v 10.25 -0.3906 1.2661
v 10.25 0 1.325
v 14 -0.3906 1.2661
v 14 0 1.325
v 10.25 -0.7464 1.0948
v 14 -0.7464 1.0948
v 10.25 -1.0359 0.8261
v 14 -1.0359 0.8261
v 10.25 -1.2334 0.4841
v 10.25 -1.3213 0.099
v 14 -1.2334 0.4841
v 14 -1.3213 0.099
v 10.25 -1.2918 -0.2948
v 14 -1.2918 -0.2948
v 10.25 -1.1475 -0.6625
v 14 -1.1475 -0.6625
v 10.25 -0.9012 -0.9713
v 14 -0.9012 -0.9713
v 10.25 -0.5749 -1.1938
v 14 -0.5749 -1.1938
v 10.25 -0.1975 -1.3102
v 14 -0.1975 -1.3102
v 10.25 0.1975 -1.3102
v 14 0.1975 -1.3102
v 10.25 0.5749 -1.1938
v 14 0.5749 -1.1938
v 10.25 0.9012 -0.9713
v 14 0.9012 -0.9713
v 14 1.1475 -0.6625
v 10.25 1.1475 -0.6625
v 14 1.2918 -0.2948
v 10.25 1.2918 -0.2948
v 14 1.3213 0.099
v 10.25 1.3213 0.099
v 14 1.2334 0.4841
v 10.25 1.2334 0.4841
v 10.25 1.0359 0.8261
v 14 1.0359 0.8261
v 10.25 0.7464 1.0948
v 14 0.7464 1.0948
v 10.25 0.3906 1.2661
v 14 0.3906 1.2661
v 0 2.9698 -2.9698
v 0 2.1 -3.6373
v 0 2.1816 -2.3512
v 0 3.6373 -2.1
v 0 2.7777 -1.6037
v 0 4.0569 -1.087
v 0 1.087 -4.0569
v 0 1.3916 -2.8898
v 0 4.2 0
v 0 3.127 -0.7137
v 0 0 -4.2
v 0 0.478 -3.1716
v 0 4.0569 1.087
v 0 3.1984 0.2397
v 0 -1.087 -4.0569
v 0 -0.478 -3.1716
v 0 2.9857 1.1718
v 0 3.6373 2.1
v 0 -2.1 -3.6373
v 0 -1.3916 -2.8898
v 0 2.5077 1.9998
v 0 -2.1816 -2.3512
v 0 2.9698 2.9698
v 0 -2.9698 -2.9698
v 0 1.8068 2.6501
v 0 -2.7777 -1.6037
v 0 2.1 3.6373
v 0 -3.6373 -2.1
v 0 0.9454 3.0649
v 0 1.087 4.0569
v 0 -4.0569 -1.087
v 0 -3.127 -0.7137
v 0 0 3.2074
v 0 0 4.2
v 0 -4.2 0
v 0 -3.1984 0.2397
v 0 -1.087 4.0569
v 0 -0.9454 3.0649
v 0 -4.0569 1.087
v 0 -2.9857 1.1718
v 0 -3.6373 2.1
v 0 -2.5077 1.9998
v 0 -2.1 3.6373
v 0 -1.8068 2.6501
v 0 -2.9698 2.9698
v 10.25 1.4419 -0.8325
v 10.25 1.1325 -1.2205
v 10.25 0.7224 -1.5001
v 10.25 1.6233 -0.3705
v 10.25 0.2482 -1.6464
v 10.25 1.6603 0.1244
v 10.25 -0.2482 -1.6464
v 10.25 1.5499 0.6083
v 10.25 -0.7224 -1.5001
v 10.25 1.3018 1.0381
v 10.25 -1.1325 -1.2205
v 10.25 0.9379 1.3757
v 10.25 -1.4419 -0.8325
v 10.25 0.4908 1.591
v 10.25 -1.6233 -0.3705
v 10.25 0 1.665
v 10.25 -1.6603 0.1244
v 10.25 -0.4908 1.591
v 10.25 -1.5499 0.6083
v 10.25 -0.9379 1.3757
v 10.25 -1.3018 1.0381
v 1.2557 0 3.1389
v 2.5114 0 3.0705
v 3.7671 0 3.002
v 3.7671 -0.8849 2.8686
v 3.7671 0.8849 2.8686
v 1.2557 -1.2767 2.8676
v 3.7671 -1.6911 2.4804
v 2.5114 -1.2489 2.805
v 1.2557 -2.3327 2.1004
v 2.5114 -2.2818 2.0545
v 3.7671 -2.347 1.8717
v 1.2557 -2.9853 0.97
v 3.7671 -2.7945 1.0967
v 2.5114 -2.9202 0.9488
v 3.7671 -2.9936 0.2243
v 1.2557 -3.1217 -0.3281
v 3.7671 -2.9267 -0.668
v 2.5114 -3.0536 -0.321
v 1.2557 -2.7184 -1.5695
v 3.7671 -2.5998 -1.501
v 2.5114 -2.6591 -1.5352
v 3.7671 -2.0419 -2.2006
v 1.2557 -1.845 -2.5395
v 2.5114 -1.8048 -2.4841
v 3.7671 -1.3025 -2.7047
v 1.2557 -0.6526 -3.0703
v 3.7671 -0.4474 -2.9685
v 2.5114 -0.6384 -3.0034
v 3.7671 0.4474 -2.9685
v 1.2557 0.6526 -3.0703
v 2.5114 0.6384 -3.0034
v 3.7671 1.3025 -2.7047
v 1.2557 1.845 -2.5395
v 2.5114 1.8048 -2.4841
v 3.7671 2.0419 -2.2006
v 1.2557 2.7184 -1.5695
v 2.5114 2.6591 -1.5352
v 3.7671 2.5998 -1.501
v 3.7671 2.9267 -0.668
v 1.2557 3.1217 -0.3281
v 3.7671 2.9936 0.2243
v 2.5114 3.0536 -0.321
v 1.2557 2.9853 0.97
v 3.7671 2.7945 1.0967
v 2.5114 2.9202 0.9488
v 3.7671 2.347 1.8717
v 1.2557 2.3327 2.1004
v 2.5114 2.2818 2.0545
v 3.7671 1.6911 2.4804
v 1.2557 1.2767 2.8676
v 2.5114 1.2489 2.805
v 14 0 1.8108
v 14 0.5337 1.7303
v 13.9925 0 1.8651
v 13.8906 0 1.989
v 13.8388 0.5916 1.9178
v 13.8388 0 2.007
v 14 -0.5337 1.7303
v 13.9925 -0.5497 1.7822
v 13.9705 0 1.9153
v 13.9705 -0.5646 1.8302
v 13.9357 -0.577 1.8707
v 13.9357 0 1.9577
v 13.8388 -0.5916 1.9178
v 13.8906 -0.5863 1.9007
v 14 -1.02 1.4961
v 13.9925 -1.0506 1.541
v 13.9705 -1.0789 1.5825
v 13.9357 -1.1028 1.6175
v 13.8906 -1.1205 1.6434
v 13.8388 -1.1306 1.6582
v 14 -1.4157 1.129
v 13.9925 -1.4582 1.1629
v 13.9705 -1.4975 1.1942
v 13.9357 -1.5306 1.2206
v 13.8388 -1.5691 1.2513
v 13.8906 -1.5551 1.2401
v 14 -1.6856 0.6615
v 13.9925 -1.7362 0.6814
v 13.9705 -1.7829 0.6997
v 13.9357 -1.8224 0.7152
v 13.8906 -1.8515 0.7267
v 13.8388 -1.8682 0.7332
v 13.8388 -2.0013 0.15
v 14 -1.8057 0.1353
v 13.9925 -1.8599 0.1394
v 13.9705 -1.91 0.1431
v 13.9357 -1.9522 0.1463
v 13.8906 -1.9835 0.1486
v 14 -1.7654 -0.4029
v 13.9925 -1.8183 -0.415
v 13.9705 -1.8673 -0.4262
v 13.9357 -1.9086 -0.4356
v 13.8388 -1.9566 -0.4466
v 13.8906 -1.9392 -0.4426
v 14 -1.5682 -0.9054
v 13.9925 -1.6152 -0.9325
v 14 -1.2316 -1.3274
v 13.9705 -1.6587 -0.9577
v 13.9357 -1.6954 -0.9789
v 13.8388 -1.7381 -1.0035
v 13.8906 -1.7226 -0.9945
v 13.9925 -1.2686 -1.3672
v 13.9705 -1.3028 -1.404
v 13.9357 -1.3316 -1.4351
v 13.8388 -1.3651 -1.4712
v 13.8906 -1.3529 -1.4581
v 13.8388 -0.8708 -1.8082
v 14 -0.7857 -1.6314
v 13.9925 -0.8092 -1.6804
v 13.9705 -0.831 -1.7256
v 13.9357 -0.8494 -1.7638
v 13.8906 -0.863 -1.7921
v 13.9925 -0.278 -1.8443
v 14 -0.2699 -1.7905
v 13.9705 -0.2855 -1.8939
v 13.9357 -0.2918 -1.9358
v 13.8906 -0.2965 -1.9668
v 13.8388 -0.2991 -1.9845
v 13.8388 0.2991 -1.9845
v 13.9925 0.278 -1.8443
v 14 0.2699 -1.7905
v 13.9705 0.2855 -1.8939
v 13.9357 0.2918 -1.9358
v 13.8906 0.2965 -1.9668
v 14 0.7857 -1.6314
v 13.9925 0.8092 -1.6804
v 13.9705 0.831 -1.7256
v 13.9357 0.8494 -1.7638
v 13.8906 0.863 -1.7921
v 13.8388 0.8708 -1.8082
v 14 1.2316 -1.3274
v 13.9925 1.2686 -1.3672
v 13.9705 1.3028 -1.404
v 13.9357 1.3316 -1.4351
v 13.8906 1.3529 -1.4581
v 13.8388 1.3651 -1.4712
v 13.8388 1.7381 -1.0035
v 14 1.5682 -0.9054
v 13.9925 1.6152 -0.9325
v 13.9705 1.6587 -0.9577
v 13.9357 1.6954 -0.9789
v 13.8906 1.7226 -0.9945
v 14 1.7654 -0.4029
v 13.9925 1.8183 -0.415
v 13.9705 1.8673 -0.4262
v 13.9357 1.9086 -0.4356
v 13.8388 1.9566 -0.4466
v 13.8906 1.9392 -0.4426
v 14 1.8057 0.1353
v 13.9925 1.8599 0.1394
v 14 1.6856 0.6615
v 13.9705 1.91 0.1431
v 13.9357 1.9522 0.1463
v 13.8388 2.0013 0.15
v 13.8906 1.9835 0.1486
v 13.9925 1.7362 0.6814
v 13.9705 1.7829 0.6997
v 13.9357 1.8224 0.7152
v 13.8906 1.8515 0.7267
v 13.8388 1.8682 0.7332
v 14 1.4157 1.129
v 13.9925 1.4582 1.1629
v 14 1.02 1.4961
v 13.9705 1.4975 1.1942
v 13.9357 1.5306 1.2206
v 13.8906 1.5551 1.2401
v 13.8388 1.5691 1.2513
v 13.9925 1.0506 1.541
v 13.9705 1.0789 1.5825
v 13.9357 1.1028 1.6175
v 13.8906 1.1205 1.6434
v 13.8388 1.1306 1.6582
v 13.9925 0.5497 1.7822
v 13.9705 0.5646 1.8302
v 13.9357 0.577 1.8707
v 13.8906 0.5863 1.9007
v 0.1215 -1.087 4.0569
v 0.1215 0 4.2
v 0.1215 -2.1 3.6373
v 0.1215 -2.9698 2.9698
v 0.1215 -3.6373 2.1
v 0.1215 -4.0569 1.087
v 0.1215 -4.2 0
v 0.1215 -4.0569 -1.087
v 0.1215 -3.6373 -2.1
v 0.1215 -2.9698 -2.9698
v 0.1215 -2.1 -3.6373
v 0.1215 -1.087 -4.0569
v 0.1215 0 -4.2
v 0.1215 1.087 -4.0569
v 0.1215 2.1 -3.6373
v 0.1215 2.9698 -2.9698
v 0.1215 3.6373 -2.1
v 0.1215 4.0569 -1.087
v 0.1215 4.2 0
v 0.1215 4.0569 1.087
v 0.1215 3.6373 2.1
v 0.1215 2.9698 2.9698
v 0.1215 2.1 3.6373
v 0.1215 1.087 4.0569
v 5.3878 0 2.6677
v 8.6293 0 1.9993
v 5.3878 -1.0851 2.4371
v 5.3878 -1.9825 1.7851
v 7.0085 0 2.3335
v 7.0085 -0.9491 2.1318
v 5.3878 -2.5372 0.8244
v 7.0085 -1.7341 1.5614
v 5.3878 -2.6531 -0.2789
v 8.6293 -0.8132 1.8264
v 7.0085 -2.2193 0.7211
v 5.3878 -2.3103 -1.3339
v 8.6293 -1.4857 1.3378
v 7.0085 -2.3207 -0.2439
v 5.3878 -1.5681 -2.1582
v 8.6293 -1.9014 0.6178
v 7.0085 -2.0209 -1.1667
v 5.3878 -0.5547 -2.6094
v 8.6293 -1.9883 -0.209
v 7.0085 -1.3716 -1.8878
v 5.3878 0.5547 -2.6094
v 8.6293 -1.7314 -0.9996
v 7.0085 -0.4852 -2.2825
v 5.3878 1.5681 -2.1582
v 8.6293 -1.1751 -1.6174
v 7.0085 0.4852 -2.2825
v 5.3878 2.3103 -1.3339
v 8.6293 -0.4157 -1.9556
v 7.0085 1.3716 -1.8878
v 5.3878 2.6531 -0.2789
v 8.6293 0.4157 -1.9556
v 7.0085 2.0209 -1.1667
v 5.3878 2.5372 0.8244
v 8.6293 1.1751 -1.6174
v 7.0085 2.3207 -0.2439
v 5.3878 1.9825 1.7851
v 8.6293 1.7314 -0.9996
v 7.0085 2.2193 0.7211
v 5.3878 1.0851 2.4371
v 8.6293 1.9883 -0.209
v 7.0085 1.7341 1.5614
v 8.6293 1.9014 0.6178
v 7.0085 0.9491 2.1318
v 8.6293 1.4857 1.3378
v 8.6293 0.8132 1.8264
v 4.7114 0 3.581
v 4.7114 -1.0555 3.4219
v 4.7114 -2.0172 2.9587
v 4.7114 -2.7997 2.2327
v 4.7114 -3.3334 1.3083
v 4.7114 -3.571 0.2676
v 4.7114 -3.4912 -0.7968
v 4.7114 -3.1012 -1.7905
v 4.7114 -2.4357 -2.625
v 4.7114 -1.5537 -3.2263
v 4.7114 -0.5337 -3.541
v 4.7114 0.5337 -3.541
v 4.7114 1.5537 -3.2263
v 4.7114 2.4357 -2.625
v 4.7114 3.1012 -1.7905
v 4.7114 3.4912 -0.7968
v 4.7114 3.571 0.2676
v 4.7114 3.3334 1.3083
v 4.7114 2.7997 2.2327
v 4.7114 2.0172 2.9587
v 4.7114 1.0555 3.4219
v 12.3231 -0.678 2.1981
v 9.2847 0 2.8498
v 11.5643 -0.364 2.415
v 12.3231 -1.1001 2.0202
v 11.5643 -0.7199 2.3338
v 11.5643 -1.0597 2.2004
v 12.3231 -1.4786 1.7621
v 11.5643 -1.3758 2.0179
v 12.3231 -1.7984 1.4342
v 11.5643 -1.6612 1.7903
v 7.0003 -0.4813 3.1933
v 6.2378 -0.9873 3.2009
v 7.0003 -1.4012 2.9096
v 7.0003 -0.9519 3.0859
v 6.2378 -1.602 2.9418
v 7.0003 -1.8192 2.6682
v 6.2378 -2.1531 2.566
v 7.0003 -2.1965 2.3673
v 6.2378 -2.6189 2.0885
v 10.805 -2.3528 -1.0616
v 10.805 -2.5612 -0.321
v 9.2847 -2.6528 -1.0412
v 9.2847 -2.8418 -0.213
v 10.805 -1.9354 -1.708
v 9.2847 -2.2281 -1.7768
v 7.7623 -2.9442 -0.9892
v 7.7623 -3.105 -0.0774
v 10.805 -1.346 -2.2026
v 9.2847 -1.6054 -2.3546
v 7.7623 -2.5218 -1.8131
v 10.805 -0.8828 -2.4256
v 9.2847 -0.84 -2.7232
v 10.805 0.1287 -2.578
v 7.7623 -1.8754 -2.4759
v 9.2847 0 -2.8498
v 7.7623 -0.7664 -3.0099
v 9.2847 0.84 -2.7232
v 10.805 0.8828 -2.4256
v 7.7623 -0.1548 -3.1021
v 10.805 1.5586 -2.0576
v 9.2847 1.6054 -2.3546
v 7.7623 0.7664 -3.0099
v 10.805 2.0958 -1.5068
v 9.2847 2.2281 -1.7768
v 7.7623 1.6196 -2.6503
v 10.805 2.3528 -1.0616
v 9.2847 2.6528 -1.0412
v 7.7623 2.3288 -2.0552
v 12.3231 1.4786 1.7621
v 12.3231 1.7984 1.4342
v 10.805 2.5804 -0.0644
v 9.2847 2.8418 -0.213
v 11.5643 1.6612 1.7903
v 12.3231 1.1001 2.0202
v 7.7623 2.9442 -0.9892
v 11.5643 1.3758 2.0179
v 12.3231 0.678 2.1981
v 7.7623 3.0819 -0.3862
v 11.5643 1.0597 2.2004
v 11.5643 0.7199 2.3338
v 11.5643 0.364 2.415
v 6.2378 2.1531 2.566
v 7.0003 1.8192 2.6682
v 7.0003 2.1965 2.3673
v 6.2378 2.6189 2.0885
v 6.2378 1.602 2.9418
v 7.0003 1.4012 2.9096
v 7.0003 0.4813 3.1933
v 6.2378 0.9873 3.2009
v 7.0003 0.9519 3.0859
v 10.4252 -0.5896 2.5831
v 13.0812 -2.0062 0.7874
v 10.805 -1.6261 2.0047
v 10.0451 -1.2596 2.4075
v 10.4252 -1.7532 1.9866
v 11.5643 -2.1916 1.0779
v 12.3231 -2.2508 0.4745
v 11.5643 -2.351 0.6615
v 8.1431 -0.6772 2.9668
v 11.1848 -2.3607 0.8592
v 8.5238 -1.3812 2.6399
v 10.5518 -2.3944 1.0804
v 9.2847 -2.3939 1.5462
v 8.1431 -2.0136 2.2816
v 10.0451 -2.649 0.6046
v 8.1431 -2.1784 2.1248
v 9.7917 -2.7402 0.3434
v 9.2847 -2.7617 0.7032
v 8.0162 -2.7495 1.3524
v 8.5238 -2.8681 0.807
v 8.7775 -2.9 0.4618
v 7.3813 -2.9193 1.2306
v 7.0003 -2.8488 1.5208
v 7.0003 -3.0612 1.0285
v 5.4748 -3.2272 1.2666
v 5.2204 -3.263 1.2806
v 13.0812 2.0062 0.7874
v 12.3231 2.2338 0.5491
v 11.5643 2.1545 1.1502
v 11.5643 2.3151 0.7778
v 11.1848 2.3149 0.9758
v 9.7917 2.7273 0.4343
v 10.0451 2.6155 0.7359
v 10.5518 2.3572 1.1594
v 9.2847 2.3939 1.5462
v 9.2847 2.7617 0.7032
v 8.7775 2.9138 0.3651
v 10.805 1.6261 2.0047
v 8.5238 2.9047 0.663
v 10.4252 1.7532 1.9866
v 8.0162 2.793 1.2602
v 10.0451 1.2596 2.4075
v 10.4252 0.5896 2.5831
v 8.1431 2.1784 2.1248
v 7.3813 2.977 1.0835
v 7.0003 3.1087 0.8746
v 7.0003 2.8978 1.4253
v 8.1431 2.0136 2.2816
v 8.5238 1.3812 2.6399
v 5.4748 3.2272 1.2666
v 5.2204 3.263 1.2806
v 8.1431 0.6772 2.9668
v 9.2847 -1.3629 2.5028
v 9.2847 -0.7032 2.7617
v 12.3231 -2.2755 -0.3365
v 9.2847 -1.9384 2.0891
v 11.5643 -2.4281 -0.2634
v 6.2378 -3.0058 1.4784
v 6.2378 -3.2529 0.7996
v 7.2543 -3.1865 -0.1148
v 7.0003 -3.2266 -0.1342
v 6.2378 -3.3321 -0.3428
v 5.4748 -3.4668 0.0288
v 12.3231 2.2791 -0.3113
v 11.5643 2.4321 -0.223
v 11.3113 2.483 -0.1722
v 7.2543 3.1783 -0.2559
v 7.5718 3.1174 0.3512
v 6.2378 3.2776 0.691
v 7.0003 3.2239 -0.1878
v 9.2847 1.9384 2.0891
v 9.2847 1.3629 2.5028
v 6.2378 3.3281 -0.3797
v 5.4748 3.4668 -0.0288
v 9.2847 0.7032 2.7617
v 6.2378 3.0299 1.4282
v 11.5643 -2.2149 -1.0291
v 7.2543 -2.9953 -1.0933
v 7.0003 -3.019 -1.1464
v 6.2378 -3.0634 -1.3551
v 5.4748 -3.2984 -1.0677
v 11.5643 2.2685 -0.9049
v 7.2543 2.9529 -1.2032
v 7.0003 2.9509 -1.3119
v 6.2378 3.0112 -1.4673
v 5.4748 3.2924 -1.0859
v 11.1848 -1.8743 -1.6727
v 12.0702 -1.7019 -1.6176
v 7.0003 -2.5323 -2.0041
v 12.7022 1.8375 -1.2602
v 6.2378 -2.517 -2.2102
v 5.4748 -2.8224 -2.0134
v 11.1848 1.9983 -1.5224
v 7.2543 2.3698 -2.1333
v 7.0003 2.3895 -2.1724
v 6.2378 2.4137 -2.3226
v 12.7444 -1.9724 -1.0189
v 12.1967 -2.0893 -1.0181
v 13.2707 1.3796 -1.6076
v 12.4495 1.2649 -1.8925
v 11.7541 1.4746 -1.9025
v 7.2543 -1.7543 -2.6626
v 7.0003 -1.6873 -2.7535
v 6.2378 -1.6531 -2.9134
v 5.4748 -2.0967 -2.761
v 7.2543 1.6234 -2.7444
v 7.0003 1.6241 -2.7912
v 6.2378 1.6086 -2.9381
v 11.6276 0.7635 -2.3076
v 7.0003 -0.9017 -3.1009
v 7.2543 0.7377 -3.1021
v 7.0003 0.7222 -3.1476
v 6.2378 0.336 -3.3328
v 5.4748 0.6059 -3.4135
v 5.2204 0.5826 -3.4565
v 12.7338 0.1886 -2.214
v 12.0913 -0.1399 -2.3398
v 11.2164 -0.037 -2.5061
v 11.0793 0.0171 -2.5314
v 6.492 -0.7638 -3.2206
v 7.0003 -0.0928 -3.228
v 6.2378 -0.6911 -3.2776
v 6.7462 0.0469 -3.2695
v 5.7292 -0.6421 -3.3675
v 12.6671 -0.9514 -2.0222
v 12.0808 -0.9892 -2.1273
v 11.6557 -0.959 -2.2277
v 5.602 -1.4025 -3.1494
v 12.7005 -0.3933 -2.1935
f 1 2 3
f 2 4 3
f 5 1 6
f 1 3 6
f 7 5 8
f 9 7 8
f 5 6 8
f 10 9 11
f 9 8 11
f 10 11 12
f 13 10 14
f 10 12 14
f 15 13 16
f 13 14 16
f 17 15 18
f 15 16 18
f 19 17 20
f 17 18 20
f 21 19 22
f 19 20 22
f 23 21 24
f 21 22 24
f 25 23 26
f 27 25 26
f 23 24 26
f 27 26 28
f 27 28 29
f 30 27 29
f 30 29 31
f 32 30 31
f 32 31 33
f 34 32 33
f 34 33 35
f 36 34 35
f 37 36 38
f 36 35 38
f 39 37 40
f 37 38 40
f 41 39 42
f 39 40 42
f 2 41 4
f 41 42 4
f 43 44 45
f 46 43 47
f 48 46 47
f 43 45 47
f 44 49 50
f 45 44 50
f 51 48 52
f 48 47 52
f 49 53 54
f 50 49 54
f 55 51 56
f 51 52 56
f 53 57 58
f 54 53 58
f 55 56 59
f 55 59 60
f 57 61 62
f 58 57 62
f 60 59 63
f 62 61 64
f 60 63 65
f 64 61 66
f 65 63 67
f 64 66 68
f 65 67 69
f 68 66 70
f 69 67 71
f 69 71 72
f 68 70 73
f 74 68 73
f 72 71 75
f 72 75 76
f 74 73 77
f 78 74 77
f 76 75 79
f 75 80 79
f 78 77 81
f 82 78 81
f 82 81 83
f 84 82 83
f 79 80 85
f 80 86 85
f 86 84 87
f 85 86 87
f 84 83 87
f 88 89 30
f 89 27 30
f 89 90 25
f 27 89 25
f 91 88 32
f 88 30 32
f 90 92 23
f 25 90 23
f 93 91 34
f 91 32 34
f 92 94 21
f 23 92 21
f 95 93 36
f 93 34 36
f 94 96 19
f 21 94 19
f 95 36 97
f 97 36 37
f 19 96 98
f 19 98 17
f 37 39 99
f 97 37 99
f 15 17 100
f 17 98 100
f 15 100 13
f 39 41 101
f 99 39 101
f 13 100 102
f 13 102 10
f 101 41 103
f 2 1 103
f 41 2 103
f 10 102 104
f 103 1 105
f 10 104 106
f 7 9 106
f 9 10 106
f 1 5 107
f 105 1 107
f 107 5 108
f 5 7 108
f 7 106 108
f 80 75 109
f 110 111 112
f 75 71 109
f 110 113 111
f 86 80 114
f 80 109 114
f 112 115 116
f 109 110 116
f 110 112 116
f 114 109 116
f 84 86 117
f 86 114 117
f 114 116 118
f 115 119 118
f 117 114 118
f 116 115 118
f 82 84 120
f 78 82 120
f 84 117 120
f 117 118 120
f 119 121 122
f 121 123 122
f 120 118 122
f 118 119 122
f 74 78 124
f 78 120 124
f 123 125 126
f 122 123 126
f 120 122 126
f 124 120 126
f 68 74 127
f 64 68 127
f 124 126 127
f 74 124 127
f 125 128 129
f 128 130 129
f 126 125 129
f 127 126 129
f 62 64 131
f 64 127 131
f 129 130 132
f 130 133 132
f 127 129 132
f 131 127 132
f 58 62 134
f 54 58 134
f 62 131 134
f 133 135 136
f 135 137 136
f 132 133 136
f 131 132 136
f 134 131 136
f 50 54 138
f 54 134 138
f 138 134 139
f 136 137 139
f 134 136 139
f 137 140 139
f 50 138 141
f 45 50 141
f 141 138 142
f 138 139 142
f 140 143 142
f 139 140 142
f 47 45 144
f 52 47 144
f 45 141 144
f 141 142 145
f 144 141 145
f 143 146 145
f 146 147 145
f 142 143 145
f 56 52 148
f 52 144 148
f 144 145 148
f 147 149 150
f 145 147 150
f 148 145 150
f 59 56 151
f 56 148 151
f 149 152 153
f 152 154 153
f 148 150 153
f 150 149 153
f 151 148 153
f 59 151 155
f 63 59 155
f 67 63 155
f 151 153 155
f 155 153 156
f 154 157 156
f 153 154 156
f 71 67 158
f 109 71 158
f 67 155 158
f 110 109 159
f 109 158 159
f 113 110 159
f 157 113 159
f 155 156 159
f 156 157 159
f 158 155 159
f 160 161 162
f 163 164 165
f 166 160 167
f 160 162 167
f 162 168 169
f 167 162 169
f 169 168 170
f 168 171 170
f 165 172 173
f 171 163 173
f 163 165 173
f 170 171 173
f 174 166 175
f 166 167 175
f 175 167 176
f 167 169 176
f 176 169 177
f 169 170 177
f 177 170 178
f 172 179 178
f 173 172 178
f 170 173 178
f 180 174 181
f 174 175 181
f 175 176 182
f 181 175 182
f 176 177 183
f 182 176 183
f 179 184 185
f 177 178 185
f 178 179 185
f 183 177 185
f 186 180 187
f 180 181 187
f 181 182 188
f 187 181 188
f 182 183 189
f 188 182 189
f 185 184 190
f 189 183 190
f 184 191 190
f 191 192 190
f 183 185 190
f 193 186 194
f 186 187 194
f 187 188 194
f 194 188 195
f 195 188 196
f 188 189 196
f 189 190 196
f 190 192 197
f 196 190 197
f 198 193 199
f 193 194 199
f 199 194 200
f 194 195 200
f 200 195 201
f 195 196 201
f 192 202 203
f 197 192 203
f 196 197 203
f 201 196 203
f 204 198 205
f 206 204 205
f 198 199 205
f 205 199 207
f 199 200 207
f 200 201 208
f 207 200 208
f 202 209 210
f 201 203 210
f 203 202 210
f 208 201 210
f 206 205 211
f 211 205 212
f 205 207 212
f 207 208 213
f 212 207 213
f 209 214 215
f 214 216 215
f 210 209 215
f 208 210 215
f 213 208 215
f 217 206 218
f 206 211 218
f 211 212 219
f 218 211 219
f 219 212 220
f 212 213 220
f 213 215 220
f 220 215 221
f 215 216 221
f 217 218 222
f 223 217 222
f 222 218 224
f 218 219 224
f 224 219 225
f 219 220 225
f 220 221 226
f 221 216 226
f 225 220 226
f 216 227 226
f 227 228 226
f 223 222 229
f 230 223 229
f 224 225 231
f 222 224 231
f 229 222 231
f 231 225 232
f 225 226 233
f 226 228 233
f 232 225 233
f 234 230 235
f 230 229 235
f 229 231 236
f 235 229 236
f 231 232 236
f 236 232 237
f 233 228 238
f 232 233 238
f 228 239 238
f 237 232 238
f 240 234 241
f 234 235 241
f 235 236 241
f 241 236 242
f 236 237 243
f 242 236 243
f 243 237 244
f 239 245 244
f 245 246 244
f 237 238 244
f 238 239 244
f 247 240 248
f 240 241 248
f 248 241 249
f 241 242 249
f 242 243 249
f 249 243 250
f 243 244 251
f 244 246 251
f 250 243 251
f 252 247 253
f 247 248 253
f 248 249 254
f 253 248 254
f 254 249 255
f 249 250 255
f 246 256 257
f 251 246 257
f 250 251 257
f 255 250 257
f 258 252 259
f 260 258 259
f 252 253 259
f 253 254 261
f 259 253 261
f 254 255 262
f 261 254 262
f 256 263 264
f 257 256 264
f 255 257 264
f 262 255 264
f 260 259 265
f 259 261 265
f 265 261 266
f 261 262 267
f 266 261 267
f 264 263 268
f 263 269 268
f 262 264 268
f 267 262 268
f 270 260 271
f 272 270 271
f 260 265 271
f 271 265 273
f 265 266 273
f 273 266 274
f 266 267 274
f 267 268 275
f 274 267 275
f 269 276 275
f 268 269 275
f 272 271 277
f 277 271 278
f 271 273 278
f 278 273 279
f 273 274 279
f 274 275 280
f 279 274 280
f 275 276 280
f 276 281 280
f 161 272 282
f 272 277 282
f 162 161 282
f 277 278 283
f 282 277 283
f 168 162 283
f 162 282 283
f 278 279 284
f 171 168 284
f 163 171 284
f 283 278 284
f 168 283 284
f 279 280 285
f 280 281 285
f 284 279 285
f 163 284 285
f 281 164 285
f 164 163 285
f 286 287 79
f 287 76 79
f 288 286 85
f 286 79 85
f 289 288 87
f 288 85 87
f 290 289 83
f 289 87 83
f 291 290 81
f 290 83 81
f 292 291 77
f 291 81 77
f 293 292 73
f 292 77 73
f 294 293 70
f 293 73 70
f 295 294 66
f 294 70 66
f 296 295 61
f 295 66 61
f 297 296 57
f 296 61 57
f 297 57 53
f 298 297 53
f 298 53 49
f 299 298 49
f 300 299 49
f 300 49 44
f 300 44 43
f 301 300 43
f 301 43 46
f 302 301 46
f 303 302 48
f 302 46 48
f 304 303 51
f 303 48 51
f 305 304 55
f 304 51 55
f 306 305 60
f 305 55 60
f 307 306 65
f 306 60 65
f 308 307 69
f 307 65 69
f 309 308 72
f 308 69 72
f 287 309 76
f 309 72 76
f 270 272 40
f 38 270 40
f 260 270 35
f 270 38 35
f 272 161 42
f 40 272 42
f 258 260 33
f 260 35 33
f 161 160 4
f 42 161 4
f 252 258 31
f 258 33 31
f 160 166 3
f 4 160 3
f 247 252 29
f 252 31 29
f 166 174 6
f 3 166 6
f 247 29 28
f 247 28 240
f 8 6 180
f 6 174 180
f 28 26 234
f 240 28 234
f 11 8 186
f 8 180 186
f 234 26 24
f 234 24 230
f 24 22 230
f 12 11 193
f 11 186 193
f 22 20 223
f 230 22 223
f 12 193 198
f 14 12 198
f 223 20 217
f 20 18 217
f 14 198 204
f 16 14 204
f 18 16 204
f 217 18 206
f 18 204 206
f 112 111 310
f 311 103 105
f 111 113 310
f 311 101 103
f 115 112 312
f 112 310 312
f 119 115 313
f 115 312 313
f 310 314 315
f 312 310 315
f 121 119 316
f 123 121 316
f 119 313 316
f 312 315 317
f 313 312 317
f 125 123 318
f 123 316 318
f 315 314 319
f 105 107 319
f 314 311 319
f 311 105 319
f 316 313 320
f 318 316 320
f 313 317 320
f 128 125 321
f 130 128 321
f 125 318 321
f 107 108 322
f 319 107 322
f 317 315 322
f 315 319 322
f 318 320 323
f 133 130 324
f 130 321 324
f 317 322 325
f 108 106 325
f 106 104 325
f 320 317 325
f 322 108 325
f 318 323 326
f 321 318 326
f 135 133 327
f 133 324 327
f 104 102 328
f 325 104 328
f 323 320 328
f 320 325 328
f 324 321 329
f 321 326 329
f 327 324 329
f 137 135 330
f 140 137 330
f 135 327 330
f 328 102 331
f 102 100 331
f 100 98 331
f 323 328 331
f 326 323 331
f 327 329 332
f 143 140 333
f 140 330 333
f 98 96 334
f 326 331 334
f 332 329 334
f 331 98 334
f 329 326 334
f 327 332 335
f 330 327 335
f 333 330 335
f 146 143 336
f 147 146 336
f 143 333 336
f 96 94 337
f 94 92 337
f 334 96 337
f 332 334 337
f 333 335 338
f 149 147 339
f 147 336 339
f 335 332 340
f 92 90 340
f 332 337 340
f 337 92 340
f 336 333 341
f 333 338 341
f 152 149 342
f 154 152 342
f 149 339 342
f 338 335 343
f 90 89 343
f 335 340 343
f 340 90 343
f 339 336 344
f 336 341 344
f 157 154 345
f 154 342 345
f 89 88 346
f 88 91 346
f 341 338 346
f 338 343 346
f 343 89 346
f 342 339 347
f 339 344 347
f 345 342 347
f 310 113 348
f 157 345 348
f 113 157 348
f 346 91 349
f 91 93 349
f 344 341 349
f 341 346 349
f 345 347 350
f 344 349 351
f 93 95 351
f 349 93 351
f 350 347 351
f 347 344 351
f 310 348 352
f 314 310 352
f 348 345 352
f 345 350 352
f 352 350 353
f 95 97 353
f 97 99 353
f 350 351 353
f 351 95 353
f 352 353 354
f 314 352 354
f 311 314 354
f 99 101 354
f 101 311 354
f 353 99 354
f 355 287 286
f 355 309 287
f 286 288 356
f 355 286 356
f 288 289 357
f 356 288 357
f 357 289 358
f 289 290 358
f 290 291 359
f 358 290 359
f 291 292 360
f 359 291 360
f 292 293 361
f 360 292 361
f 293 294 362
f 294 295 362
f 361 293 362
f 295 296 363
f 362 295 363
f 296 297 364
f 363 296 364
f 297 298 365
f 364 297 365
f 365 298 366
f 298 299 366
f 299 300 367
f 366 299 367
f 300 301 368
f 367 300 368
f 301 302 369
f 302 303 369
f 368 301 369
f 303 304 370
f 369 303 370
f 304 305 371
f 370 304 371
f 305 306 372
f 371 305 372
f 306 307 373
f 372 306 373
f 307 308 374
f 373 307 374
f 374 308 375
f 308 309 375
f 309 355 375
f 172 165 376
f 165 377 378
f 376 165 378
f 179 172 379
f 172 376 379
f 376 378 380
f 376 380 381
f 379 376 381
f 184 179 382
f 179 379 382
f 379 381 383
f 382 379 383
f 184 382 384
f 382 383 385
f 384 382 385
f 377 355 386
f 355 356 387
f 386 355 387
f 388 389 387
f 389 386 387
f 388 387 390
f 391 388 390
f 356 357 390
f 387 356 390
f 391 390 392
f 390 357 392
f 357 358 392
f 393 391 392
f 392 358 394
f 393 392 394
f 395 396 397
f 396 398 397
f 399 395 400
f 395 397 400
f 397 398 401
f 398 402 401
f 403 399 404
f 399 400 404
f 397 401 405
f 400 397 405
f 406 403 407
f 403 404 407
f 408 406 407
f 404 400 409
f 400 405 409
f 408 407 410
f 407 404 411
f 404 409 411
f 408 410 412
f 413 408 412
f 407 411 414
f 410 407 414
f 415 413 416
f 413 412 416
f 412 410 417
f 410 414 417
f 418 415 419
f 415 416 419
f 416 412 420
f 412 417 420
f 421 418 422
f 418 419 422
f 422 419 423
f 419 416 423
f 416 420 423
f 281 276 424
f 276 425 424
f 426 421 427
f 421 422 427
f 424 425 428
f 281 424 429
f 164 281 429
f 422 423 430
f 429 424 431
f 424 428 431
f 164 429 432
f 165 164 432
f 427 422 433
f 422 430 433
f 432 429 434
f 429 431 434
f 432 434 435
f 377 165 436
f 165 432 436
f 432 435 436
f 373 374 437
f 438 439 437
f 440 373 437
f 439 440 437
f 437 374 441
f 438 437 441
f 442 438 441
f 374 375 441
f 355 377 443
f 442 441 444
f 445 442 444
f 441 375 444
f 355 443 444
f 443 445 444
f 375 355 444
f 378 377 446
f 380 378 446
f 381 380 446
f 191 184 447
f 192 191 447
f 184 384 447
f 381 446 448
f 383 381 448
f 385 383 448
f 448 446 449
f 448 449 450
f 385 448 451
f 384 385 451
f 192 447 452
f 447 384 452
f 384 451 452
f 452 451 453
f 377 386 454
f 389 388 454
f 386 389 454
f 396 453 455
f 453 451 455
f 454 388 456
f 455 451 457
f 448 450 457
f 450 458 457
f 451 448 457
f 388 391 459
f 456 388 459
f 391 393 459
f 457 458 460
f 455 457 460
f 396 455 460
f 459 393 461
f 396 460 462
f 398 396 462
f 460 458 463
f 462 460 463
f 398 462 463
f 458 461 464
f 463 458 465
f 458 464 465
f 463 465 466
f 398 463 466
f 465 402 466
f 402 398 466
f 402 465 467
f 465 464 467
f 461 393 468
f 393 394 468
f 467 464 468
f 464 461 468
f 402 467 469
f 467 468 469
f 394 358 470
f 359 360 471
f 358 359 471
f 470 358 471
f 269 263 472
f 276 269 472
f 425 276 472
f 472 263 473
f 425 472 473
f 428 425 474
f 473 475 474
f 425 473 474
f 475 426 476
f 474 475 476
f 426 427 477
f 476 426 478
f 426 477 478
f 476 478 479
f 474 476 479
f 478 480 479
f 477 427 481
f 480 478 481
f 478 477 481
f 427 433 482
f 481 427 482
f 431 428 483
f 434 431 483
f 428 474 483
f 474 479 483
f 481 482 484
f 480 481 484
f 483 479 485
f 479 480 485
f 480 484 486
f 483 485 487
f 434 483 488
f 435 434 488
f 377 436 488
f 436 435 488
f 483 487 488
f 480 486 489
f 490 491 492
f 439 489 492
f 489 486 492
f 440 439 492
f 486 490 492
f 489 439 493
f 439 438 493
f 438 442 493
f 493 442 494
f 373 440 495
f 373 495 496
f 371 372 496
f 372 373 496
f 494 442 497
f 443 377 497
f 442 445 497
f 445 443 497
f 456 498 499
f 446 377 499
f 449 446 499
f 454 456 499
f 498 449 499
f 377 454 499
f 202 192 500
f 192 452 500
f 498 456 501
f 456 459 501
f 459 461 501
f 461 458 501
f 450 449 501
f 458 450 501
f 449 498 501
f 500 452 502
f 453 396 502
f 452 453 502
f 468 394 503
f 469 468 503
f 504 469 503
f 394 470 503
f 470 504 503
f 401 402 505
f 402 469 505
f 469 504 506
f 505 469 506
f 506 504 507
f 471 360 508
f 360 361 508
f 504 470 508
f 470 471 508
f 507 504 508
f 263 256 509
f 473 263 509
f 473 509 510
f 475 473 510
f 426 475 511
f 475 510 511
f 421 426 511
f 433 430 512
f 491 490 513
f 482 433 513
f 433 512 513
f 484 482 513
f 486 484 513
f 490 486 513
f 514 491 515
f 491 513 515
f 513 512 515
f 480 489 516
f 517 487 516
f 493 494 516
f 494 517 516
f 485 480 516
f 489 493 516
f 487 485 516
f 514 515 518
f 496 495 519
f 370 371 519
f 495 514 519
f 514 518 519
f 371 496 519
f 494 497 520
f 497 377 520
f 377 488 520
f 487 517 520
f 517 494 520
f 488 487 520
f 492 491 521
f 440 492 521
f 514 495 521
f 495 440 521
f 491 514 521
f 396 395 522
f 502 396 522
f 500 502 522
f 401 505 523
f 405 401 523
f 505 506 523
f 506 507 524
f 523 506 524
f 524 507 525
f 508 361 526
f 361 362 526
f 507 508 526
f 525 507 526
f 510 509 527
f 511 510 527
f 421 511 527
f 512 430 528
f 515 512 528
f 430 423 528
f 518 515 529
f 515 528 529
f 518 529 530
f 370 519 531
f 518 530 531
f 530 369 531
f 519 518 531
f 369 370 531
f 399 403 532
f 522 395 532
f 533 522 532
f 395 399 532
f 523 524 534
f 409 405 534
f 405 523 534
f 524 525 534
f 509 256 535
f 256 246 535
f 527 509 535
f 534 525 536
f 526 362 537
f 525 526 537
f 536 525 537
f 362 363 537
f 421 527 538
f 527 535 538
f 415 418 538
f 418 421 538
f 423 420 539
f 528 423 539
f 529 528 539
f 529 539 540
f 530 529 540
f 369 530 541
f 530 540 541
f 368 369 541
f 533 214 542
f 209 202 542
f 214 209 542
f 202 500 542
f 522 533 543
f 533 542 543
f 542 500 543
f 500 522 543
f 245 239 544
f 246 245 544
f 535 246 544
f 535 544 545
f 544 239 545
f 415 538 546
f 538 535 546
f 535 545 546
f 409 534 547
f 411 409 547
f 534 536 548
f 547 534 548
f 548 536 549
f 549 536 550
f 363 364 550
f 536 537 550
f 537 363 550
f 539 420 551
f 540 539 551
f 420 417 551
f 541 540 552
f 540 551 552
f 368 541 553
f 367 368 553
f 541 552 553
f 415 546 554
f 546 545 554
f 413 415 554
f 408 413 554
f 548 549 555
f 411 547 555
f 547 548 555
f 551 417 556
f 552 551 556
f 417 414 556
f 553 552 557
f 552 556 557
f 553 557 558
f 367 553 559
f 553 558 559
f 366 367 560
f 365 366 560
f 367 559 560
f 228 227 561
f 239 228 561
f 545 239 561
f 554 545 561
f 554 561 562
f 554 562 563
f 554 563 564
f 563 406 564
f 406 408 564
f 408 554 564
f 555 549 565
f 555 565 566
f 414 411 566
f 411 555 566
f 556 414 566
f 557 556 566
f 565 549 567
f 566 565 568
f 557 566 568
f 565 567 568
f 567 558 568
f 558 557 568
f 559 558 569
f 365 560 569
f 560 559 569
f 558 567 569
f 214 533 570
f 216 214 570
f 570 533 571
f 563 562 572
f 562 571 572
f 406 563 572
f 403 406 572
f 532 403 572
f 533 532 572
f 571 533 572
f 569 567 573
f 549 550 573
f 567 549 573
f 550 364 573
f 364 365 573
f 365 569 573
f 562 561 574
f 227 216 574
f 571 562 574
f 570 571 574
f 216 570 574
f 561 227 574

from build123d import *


with BuildPart() as part:
    # Esboço1 → Revolução1 (revolve)
    with BuildSketch(Plane.XY, mode=Mode.PRIVATE) as revolu_o1_sk:
        with BuildLine():
            Line((10.25, 1.665004796), (10.25, 1.325))
            Line((10.25, 1.325), (14, 1.325))
            Line((14, 1.325), (14, 1.810751674))
            ThreePointArc((14, 1.810751674), (13.954531856, 1.937715864), (13.838800945, 2.006951793))
            ThreePointArc((13.838800945, 2.006951793), (7.000290487, 3.229378761), (0.121522619, 4.2))
            Line((0.121522619, 4.2), (0, 4.2))
            Line((0, 4.2), (0, 3.207411337))
            Line((0, 3.207411337), (3.76708994, 3.001987913))
            Line((3.76708994, 3.001987913), (10.25, 1.665004796))
        make_face()
    revolve(revolu_o1_sk.sketch.rotate(Axis((0, 0, 0), (1, 0, 0)), 90), axis=Axis((0, 0, 0), (1, 0, 0)))


solid = part.part
